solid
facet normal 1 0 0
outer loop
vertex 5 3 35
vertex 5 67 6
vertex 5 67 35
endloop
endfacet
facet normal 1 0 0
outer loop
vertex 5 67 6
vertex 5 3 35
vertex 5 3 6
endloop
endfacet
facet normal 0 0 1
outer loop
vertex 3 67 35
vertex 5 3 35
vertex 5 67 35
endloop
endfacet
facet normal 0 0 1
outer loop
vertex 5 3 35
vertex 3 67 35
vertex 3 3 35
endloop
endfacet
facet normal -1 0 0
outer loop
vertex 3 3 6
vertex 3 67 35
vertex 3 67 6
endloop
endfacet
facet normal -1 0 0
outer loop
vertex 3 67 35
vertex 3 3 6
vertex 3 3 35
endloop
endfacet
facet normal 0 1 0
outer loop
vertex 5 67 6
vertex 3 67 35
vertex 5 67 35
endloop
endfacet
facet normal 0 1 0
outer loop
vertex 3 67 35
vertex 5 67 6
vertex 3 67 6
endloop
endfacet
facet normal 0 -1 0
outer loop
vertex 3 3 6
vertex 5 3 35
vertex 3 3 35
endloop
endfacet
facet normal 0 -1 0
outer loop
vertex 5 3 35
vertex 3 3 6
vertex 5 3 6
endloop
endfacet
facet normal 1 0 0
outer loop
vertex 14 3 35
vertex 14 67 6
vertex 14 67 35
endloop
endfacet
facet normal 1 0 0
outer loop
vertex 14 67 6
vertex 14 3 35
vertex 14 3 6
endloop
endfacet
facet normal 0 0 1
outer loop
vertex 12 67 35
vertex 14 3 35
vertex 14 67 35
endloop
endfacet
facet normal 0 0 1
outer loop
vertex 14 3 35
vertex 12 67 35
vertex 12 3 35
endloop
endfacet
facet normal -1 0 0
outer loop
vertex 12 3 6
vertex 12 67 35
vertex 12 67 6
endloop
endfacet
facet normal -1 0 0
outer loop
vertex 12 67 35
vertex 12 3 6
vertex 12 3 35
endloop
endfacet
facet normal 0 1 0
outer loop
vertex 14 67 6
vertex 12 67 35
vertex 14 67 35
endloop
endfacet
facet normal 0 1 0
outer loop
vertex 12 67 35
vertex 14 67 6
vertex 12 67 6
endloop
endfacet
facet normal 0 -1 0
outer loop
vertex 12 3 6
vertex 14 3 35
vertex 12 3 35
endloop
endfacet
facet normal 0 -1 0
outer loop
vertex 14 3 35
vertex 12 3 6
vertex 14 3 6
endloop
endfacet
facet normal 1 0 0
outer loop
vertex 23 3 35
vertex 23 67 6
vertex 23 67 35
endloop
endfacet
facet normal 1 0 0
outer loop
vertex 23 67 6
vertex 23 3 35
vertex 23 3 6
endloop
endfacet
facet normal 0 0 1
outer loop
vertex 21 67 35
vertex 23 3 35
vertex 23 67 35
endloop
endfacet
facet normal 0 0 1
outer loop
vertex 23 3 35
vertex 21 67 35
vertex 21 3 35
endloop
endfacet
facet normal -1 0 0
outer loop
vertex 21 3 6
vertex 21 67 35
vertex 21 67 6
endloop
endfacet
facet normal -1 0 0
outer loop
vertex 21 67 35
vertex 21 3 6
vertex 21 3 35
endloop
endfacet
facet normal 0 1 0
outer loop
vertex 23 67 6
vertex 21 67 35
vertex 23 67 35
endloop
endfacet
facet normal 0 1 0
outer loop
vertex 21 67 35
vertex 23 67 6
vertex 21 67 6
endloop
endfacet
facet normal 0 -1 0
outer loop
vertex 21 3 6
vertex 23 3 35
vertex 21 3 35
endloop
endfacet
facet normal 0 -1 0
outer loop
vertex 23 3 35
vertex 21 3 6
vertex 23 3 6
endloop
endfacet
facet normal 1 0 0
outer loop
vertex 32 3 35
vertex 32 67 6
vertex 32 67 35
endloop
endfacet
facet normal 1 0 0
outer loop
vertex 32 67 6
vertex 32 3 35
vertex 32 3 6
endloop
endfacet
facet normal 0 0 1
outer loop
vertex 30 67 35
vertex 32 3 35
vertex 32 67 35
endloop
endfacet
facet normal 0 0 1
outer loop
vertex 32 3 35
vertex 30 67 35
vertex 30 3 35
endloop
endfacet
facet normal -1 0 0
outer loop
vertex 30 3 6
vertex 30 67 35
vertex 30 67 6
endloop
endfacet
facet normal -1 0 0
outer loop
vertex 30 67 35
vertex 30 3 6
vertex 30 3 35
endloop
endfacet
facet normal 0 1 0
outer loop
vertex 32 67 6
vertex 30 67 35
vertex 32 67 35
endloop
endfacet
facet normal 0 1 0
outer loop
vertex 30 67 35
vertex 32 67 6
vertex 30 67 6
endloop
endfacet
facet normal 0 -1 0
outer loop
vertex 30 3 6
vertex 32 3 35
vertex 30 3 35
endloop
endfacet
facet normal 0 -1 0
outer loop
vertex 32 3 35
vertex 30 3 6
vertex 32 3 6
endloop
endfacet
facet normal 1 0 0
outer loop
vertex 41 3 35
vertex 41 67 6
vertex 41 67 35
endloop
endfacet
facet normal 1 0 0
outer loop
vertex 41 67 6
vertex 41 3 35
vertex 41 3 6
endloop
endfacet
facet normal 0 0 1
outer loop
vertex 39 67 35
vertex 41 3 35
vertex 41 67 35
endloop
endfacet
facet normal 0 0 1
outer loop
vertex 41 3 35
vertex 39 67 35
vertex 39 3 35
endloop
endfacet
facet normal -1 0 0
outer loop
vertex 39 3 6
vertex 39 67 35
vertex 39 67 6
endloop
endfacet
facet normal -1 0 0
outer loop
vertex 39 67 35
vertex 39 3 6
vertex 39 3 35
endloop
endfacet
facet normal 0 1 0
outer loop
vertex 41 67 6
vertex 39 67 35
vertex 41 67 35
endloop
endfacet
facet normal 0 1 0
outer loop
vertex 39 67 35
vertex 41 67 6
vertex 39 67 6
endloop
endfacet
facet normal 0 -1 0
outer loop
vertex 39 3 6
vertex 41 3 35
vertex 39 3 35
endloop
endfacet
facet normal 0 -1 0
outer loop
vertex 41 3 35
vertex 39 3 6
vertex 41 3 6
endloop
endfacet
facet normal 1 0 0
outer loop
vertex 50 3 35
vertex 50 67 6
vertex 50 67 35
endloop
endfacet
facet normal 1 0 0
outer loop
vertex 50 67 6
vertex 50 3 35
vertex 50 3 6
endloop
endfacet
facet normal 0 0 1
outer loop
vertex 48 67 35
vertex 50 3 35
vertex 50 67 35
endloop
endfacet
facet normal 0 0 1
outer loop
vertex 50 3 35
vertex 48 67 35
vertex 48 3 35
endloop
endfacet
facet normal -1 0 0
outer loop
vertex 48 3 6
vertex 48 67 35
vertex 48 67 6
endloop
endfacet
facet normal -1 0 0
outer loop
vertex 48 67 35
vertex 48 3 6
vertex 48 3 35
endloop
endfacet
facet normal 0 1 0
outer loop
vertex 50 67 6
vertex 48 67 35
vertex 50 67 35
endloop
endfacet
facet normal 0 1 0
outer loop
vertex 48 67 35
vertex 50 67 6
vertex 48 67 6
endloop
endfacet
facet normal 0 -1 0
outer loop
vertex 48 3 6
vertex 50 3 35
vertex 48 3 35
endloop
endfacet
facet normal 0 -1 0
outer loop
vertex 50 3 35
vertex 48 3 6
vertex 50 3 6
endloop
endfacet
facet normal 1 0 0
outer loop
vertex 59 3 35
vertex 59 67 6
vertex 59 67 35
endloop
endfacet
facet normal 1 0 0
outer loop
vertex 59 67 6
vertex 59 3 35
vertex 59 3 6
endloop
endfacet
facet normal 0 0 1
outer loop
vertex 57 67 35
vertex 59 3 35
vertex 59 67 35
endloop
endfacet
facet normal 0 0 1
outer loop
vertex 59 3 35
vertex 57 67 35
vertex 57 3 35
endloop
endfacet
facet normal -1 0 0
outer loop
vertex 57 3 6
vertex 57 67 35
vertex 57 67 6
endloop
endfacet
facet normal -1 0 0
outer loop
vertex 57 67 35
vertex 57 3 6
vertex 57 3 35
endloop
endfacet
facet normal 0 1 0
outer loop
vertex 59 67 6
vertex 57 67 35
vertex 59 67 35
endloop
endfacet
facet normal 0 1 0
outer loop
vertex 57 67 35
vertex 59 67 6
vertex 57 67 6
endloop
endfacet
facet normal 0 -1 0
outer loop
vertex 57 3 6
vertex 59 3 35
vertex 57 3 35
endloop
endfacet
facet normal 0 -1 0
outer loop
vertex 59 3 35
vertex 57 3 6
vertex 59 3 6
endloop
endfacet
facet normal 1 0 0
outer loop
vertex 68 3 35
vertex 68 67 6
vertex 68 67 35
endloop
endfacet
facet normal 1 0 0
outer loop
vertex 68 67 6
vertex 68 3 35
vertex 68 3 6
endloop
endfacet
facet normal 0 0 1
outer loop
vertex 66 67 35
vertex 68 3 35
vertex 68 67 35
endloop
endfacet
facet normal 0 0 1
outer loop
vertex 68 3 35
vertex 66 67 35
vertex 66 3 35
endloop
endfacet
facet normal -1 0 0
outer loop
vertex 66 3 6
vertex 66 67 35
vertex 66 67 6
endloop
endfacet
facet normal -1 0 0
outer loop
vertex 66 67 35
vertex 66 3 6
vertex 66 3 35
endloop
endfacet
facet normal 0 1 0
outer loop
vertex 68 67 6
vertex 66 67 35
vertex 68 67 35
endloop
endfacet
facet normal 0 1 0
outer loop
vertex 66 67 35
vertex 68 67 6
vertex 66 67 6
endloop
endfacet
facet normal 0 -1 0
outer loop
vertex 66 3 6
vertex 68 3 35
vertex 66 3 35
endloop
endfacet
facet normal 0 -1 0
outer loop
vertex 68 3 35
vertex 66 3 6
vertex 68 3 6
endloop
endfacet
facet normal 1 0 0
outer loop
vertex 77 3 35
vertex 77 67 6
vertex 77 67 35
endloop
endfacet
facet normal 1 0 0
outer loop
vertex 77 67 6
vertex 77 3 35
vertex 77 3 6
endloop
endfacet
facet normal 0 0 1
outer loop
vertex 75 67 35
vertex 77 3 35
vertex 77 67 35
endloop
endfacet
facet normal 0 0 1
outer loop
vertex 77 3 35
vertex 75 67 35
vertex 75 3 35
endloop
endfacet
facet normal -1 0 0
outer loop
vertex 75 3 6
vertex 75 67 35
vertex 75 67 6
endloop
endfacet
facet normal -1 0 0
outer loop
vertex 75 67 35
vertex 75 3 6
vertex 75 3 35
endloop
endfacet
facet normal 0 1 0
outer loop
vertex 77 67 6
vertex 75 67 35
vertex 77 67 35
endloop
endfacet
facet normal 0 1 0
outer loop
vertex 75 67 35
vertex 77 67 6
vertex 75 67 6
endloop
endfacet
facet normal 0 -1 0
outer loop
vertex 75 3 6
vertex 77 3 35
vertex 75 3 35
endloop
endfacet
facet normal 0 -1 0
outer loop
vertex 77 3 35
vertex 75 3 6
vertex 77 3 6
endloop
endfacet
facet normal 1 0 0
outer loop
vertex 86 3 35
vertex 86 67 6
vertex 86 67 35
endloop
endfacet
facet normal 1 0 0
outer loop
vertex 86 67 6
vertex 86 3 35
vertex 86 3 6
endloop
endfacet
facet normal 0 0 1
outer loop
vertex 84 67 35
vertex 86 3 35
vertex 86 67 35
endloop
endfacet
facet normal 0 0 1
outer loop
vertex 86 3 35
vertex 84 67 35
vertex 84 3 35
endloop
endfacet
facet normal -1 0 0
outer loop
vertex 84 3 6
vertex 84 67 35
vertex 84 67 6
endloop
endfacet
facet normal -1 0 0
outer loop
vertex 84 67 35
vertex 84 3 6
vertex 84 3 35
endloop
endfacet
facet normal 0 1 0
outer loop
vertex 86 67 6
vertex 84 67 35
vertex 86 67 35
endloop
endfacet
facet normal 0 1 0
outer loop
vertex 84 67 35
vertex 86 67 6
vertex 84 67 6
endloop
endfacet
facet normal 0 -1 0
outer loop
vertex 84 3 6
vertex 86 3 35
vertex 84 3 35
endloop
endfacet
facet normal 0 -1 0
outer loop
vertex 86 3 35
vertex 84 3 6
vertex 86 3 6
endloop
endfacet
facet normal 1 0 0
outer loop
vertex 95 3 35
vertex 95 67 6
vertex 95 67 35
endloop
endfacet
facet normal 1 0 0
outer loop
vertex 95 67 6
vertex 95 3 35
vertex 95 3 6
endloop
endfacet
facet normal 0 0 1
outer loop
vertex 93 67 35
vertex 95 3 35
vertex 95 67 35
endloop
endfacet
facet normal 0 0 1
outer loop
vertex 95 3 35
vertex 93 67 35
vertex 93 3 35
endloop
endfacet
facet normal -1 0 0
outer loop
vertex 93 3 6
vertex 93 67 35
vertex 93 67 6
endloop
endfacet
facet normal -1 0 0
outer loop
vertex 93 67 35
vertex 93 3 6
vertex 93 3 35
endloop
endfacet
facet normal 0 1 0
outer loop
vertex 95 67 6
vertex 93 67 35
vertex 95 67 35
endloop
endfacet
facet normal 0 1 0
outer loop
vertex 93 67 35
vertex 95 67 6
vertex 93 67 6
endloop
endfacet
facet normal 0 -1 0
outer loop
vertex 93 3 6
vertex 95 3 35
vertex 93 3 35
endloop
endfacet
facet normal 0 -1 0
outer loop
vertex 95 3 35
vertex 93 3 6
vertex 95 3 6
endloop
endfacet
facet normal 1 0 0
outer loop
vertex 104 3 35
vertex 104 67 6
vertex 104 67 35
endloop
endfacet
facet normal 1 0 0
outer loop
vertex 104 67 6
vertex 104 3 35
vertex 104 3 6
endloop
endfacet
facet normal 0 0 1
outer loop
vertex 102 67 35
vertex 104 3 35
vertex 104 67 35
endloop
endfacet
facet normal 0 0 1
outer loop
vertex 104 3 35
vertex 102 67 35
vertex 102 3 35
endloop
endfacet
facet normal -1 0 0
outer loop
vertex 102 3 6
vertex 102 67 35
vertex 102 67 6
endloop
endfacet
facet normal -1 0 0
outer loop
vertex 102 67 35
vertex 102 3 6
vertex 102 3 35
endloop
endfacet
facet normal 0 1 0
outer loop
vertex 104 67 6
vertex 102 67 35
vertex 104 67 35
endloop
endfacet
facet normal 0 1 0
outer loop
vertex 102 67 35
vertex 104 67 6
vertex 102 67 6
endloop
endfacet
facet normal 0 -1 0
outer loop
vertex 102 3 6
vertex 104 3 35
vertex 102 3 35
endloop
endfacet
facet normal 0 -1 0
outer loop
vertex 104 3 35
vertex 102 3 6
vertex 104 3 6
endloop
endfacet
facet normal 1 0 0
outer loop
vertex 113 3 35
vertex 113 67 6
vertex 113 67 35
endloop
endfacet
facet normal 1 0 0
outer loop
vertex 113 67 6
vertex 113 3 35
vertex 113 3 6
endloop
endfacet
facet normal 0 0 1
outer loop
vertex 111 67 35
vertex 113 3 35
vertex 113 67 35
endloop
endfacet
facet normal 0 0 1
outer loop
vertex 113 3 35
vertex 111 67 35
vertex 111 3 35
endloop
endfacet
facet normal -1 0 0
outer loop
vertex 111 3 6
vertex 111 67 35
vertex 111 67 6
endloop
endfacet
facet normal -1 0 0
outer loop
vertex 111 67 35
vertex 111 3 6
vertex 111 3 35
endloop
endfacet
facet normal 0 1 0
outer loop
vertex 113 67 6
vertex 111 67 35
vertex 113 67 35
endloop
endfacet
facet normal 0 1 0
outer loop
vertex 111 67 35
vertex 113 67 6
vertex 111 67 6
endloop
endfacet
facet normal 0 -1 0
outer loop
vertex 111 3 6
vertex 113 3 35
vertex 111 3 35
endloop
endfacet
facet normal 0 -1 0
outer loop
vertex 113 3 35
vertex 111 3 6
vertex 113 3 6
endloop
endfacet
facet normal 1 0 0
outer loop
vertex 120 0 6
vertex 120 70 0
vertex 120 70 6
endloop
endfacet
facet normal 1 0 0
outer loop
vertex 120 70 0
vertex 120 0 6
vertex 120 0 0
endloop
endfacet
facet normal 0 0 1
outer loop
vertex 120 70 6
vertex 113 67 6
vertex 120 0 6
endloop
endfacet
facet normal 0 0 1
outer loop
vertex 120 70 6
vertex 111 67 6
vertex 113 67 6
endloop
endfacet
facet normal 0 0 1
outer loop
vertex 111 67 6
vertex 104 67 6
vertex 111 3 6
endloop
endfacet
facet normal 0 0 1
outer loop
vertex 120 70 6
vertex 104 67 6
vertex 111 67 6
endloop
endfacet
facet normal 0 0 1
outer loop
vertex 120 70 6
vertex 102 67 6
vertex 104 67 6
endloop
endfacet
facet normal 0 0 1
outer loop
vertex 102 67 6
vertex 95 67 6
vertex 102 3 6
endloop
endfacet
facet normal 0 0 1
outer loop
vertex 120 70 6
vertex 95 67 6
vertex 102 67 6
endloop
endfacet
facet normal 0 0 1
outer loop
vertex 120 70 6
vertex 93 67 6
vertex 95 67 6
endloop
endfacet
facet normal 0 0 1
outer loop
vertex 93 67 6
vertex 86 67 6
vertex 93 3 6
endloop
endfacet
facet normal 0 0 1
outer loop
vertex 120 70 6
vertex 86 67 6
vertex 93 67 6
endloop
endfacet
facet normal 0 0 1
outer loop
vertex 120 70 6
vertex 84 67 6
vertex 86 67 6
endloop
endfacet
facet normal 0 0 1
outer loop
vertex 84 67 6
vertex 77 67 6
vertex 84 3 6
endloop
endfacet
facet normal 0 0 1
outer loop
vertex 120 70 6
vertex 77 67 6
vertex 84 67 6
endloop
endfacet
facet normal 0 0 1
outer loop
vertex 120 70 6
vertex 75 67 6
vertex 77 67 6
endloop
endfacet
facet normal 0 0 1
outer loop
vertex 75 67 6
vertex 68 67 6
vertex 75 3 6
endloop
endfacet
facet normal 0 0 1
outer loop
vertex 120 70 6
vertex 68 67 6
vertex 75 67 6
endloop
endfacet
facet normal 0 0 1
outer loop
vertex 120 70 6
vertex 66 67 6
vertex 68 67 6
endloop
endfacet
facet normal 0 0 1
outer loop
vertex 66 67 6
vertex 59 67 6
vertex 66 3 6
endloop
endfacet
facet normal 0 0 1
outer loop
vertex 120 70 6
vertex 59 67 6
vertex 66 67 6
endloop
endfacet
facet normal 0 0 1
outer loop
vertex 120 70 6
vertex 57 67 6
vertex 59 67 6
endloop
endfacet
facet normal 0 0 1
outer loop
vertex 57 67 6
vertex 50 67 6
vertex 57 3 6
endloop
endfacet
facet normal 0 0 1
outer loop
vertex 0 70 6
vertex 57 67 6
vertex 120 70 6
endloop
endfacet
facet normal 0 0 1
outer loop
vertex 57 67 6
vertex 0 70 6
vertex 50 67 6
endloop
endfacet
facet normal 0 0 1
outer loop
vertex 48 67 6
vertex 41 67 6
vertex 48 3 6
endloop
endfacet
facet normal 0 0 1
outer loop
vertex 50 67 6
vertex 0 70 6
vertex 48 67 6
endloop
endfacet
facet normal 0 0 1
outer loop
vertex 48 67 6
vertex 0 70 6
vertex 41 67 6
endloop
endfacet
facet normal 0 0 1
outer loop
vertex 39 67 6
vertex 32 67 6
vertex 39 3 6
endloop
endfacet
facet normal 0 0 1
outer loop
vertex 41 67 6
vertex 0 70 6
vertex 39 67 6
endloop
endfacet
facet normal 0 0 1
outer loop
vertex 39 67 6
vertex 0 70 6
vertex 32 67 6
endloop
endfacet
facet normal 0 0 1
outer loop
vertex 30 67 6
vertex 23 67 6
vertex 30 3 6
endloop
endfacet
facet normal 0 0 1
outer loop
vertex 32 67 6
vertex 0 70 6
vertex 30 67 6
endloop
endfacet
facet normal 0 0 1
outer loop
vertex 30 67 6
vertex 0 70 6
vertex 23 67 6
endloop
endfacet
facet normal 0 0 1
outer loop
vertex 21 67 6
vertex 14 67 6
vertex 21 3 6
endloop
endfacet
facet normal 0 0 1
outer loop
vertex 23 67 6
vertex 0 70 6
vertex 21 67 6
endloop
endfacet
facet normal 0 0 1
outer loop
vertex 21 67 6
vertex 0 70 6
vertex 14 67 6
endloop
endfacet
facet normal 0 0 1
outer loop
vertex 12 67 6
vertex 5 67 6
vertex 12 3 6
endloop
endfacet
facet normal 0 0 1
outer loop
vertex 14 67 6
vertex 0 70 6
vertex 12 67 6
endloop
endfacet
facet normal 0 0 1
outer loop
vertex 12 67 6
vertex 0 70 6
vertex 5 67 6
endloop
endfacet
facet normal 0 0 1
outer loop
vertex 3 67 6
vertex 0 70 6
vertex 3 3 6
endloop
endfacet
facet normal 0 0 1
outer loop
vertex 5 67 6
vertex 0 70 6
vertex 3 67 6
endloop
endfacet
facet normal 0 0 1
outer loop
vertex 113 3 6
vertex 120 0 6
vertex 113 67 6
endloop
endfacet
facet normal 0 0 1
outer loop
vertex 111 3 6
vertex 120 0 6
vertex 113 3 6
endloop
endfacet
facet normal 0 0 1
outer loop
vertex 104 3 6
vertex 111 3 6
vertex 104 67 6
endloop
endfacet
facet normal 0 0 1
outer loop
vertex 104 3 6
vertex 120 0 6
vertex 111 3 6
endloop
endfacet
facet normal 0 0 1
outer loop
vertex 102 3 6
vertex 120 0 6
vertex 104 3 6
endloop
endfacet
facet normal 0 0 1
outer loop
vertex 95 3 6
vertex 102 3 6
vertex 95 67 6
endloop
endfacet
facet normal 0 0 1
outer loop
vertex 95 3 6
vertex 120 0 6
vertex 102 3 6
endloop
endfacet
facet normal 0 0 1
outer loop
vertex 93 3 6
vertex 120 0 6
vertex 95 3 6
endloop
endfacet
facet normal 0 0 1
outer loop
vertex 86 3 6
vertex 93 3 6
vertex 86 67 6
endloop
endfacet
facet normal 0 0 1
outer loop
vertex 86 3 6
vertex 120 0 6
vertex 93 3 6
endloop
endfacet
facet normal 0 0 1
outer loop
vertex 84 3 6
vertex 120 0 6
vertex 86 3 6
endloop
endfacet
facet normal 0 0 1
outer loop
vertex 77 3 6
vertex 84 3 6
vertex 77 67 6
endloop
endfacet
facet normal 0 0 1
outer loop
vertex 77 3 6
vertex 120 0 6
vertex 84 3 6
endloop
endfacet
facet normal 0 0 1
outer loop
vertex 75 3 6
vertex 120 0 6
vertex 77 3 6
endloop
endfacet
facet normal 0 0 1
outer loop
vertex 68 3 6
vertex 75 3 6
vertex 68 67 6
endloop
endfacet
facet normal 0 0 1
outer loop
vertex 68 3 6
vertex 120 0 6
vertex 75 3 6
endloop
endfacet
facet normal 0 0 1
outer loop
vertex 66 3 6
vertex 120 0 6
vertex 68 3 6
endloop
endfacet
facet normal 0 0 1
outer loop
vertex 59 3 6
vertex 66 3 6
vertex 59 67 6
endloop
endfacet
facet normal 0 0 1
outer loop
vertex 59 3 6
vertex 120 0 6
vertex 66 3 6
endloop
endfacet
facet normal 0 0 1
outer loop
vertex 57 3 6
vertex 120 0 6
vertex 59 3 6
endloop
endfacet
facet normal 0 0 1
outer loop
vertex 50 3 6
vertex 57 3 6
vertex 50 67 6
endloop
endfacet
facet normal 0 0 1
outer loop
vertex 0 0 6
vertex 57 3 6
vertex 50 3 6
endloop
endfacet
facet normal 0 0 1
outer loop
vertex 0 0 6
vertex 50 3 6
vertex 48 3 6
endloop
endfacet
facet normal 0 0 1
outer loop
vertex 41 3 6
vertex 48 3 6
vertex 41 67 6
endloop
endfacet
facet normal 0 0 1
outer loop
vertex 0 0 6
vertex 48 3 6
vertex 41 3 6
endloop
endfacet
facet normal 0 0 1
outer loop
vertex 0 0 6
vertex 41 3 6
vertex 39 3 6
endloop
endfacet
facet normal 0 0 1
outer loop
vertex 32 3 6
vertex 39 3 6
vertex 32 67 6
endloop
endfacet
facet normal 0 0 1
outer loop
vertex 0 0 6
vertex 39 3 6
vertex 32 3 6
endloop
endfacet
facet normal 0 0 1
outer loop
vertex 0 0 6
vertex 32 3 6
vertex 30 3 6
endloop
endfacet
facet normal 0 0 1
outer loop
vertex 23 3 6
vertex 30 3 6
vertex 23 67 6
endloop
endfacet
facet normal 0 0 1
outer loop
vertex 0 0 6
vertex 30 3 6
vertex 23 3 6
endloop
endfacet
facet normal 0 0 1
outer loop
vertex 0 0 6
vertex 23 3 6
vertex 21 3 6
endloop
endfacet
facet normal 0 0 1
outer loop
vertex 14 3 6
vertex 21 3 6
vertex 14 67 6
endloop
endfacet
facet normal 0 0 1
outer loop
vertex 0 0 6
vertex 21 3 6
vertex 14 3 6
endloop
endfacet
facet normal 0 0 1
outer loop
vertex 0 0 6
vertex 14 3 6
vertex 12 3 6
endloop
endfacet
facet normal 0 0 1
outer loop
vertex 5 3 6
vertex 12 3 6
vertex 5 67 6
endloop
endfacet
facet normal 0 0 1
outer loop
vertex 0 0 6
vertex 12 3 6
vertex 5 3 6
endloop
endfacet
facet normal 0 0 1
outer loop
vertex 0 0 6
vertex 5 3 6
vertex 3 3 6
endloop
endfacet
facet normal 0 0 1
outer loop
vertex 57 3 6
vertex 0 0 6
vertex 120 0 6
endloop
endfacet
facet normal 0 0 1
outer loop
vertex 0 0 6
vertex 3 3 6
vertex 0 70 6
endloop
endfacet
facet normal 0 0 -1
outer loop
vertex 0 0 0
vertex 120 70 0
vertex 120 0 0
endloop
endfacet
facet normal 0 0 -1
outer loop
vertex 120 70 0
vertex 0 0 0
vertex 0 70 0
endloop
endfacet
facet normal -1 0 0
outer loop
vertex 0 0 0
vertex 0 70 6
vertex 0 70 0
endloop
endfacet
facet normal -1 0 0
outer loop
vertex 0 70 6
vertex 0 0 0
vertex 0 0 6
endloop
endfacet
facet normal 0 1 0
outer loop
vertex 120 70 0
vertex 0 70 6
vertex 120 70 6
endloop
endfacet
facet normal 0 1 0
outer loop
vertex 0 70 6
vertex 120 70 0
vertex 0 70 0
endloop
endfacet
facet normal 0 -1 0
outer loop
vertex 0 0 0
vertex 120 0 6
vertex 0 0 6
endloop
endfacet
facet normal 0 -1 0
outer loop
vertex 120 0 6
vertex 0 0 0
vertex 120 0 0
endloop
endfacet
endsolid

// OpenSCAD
$fn = 32;

// ----------------------------------------------------------------------
// Heatsink: uniform fin block
// ----------------------------------------------------------------------

// --- parameters (mm) ---
base_l = 120;             // base length, X
base_w = 70;              // base width, Y
base_t = 6;               // base plate thickness
fin_h = 30;               // fin height above the base
fin_t = 2;                // fin thickness
edge = 3;                 // margin from the base ends
pitch = 9;                // fin pitch

n_fins = floor((base_l - 2 * edge - fin_t) / pitch) + 1;  // fin count
total_h = base_t + fin_h - 1;  // overall height

union() {
  cube([base_l, base_w, base_t]);
  for (i = [0 : n_fins - 1])
    translate([edge + i * pitch, edge, base_t - 1])
      cube([fin_t, base_w - 2 * edge, fin_h]);
}
